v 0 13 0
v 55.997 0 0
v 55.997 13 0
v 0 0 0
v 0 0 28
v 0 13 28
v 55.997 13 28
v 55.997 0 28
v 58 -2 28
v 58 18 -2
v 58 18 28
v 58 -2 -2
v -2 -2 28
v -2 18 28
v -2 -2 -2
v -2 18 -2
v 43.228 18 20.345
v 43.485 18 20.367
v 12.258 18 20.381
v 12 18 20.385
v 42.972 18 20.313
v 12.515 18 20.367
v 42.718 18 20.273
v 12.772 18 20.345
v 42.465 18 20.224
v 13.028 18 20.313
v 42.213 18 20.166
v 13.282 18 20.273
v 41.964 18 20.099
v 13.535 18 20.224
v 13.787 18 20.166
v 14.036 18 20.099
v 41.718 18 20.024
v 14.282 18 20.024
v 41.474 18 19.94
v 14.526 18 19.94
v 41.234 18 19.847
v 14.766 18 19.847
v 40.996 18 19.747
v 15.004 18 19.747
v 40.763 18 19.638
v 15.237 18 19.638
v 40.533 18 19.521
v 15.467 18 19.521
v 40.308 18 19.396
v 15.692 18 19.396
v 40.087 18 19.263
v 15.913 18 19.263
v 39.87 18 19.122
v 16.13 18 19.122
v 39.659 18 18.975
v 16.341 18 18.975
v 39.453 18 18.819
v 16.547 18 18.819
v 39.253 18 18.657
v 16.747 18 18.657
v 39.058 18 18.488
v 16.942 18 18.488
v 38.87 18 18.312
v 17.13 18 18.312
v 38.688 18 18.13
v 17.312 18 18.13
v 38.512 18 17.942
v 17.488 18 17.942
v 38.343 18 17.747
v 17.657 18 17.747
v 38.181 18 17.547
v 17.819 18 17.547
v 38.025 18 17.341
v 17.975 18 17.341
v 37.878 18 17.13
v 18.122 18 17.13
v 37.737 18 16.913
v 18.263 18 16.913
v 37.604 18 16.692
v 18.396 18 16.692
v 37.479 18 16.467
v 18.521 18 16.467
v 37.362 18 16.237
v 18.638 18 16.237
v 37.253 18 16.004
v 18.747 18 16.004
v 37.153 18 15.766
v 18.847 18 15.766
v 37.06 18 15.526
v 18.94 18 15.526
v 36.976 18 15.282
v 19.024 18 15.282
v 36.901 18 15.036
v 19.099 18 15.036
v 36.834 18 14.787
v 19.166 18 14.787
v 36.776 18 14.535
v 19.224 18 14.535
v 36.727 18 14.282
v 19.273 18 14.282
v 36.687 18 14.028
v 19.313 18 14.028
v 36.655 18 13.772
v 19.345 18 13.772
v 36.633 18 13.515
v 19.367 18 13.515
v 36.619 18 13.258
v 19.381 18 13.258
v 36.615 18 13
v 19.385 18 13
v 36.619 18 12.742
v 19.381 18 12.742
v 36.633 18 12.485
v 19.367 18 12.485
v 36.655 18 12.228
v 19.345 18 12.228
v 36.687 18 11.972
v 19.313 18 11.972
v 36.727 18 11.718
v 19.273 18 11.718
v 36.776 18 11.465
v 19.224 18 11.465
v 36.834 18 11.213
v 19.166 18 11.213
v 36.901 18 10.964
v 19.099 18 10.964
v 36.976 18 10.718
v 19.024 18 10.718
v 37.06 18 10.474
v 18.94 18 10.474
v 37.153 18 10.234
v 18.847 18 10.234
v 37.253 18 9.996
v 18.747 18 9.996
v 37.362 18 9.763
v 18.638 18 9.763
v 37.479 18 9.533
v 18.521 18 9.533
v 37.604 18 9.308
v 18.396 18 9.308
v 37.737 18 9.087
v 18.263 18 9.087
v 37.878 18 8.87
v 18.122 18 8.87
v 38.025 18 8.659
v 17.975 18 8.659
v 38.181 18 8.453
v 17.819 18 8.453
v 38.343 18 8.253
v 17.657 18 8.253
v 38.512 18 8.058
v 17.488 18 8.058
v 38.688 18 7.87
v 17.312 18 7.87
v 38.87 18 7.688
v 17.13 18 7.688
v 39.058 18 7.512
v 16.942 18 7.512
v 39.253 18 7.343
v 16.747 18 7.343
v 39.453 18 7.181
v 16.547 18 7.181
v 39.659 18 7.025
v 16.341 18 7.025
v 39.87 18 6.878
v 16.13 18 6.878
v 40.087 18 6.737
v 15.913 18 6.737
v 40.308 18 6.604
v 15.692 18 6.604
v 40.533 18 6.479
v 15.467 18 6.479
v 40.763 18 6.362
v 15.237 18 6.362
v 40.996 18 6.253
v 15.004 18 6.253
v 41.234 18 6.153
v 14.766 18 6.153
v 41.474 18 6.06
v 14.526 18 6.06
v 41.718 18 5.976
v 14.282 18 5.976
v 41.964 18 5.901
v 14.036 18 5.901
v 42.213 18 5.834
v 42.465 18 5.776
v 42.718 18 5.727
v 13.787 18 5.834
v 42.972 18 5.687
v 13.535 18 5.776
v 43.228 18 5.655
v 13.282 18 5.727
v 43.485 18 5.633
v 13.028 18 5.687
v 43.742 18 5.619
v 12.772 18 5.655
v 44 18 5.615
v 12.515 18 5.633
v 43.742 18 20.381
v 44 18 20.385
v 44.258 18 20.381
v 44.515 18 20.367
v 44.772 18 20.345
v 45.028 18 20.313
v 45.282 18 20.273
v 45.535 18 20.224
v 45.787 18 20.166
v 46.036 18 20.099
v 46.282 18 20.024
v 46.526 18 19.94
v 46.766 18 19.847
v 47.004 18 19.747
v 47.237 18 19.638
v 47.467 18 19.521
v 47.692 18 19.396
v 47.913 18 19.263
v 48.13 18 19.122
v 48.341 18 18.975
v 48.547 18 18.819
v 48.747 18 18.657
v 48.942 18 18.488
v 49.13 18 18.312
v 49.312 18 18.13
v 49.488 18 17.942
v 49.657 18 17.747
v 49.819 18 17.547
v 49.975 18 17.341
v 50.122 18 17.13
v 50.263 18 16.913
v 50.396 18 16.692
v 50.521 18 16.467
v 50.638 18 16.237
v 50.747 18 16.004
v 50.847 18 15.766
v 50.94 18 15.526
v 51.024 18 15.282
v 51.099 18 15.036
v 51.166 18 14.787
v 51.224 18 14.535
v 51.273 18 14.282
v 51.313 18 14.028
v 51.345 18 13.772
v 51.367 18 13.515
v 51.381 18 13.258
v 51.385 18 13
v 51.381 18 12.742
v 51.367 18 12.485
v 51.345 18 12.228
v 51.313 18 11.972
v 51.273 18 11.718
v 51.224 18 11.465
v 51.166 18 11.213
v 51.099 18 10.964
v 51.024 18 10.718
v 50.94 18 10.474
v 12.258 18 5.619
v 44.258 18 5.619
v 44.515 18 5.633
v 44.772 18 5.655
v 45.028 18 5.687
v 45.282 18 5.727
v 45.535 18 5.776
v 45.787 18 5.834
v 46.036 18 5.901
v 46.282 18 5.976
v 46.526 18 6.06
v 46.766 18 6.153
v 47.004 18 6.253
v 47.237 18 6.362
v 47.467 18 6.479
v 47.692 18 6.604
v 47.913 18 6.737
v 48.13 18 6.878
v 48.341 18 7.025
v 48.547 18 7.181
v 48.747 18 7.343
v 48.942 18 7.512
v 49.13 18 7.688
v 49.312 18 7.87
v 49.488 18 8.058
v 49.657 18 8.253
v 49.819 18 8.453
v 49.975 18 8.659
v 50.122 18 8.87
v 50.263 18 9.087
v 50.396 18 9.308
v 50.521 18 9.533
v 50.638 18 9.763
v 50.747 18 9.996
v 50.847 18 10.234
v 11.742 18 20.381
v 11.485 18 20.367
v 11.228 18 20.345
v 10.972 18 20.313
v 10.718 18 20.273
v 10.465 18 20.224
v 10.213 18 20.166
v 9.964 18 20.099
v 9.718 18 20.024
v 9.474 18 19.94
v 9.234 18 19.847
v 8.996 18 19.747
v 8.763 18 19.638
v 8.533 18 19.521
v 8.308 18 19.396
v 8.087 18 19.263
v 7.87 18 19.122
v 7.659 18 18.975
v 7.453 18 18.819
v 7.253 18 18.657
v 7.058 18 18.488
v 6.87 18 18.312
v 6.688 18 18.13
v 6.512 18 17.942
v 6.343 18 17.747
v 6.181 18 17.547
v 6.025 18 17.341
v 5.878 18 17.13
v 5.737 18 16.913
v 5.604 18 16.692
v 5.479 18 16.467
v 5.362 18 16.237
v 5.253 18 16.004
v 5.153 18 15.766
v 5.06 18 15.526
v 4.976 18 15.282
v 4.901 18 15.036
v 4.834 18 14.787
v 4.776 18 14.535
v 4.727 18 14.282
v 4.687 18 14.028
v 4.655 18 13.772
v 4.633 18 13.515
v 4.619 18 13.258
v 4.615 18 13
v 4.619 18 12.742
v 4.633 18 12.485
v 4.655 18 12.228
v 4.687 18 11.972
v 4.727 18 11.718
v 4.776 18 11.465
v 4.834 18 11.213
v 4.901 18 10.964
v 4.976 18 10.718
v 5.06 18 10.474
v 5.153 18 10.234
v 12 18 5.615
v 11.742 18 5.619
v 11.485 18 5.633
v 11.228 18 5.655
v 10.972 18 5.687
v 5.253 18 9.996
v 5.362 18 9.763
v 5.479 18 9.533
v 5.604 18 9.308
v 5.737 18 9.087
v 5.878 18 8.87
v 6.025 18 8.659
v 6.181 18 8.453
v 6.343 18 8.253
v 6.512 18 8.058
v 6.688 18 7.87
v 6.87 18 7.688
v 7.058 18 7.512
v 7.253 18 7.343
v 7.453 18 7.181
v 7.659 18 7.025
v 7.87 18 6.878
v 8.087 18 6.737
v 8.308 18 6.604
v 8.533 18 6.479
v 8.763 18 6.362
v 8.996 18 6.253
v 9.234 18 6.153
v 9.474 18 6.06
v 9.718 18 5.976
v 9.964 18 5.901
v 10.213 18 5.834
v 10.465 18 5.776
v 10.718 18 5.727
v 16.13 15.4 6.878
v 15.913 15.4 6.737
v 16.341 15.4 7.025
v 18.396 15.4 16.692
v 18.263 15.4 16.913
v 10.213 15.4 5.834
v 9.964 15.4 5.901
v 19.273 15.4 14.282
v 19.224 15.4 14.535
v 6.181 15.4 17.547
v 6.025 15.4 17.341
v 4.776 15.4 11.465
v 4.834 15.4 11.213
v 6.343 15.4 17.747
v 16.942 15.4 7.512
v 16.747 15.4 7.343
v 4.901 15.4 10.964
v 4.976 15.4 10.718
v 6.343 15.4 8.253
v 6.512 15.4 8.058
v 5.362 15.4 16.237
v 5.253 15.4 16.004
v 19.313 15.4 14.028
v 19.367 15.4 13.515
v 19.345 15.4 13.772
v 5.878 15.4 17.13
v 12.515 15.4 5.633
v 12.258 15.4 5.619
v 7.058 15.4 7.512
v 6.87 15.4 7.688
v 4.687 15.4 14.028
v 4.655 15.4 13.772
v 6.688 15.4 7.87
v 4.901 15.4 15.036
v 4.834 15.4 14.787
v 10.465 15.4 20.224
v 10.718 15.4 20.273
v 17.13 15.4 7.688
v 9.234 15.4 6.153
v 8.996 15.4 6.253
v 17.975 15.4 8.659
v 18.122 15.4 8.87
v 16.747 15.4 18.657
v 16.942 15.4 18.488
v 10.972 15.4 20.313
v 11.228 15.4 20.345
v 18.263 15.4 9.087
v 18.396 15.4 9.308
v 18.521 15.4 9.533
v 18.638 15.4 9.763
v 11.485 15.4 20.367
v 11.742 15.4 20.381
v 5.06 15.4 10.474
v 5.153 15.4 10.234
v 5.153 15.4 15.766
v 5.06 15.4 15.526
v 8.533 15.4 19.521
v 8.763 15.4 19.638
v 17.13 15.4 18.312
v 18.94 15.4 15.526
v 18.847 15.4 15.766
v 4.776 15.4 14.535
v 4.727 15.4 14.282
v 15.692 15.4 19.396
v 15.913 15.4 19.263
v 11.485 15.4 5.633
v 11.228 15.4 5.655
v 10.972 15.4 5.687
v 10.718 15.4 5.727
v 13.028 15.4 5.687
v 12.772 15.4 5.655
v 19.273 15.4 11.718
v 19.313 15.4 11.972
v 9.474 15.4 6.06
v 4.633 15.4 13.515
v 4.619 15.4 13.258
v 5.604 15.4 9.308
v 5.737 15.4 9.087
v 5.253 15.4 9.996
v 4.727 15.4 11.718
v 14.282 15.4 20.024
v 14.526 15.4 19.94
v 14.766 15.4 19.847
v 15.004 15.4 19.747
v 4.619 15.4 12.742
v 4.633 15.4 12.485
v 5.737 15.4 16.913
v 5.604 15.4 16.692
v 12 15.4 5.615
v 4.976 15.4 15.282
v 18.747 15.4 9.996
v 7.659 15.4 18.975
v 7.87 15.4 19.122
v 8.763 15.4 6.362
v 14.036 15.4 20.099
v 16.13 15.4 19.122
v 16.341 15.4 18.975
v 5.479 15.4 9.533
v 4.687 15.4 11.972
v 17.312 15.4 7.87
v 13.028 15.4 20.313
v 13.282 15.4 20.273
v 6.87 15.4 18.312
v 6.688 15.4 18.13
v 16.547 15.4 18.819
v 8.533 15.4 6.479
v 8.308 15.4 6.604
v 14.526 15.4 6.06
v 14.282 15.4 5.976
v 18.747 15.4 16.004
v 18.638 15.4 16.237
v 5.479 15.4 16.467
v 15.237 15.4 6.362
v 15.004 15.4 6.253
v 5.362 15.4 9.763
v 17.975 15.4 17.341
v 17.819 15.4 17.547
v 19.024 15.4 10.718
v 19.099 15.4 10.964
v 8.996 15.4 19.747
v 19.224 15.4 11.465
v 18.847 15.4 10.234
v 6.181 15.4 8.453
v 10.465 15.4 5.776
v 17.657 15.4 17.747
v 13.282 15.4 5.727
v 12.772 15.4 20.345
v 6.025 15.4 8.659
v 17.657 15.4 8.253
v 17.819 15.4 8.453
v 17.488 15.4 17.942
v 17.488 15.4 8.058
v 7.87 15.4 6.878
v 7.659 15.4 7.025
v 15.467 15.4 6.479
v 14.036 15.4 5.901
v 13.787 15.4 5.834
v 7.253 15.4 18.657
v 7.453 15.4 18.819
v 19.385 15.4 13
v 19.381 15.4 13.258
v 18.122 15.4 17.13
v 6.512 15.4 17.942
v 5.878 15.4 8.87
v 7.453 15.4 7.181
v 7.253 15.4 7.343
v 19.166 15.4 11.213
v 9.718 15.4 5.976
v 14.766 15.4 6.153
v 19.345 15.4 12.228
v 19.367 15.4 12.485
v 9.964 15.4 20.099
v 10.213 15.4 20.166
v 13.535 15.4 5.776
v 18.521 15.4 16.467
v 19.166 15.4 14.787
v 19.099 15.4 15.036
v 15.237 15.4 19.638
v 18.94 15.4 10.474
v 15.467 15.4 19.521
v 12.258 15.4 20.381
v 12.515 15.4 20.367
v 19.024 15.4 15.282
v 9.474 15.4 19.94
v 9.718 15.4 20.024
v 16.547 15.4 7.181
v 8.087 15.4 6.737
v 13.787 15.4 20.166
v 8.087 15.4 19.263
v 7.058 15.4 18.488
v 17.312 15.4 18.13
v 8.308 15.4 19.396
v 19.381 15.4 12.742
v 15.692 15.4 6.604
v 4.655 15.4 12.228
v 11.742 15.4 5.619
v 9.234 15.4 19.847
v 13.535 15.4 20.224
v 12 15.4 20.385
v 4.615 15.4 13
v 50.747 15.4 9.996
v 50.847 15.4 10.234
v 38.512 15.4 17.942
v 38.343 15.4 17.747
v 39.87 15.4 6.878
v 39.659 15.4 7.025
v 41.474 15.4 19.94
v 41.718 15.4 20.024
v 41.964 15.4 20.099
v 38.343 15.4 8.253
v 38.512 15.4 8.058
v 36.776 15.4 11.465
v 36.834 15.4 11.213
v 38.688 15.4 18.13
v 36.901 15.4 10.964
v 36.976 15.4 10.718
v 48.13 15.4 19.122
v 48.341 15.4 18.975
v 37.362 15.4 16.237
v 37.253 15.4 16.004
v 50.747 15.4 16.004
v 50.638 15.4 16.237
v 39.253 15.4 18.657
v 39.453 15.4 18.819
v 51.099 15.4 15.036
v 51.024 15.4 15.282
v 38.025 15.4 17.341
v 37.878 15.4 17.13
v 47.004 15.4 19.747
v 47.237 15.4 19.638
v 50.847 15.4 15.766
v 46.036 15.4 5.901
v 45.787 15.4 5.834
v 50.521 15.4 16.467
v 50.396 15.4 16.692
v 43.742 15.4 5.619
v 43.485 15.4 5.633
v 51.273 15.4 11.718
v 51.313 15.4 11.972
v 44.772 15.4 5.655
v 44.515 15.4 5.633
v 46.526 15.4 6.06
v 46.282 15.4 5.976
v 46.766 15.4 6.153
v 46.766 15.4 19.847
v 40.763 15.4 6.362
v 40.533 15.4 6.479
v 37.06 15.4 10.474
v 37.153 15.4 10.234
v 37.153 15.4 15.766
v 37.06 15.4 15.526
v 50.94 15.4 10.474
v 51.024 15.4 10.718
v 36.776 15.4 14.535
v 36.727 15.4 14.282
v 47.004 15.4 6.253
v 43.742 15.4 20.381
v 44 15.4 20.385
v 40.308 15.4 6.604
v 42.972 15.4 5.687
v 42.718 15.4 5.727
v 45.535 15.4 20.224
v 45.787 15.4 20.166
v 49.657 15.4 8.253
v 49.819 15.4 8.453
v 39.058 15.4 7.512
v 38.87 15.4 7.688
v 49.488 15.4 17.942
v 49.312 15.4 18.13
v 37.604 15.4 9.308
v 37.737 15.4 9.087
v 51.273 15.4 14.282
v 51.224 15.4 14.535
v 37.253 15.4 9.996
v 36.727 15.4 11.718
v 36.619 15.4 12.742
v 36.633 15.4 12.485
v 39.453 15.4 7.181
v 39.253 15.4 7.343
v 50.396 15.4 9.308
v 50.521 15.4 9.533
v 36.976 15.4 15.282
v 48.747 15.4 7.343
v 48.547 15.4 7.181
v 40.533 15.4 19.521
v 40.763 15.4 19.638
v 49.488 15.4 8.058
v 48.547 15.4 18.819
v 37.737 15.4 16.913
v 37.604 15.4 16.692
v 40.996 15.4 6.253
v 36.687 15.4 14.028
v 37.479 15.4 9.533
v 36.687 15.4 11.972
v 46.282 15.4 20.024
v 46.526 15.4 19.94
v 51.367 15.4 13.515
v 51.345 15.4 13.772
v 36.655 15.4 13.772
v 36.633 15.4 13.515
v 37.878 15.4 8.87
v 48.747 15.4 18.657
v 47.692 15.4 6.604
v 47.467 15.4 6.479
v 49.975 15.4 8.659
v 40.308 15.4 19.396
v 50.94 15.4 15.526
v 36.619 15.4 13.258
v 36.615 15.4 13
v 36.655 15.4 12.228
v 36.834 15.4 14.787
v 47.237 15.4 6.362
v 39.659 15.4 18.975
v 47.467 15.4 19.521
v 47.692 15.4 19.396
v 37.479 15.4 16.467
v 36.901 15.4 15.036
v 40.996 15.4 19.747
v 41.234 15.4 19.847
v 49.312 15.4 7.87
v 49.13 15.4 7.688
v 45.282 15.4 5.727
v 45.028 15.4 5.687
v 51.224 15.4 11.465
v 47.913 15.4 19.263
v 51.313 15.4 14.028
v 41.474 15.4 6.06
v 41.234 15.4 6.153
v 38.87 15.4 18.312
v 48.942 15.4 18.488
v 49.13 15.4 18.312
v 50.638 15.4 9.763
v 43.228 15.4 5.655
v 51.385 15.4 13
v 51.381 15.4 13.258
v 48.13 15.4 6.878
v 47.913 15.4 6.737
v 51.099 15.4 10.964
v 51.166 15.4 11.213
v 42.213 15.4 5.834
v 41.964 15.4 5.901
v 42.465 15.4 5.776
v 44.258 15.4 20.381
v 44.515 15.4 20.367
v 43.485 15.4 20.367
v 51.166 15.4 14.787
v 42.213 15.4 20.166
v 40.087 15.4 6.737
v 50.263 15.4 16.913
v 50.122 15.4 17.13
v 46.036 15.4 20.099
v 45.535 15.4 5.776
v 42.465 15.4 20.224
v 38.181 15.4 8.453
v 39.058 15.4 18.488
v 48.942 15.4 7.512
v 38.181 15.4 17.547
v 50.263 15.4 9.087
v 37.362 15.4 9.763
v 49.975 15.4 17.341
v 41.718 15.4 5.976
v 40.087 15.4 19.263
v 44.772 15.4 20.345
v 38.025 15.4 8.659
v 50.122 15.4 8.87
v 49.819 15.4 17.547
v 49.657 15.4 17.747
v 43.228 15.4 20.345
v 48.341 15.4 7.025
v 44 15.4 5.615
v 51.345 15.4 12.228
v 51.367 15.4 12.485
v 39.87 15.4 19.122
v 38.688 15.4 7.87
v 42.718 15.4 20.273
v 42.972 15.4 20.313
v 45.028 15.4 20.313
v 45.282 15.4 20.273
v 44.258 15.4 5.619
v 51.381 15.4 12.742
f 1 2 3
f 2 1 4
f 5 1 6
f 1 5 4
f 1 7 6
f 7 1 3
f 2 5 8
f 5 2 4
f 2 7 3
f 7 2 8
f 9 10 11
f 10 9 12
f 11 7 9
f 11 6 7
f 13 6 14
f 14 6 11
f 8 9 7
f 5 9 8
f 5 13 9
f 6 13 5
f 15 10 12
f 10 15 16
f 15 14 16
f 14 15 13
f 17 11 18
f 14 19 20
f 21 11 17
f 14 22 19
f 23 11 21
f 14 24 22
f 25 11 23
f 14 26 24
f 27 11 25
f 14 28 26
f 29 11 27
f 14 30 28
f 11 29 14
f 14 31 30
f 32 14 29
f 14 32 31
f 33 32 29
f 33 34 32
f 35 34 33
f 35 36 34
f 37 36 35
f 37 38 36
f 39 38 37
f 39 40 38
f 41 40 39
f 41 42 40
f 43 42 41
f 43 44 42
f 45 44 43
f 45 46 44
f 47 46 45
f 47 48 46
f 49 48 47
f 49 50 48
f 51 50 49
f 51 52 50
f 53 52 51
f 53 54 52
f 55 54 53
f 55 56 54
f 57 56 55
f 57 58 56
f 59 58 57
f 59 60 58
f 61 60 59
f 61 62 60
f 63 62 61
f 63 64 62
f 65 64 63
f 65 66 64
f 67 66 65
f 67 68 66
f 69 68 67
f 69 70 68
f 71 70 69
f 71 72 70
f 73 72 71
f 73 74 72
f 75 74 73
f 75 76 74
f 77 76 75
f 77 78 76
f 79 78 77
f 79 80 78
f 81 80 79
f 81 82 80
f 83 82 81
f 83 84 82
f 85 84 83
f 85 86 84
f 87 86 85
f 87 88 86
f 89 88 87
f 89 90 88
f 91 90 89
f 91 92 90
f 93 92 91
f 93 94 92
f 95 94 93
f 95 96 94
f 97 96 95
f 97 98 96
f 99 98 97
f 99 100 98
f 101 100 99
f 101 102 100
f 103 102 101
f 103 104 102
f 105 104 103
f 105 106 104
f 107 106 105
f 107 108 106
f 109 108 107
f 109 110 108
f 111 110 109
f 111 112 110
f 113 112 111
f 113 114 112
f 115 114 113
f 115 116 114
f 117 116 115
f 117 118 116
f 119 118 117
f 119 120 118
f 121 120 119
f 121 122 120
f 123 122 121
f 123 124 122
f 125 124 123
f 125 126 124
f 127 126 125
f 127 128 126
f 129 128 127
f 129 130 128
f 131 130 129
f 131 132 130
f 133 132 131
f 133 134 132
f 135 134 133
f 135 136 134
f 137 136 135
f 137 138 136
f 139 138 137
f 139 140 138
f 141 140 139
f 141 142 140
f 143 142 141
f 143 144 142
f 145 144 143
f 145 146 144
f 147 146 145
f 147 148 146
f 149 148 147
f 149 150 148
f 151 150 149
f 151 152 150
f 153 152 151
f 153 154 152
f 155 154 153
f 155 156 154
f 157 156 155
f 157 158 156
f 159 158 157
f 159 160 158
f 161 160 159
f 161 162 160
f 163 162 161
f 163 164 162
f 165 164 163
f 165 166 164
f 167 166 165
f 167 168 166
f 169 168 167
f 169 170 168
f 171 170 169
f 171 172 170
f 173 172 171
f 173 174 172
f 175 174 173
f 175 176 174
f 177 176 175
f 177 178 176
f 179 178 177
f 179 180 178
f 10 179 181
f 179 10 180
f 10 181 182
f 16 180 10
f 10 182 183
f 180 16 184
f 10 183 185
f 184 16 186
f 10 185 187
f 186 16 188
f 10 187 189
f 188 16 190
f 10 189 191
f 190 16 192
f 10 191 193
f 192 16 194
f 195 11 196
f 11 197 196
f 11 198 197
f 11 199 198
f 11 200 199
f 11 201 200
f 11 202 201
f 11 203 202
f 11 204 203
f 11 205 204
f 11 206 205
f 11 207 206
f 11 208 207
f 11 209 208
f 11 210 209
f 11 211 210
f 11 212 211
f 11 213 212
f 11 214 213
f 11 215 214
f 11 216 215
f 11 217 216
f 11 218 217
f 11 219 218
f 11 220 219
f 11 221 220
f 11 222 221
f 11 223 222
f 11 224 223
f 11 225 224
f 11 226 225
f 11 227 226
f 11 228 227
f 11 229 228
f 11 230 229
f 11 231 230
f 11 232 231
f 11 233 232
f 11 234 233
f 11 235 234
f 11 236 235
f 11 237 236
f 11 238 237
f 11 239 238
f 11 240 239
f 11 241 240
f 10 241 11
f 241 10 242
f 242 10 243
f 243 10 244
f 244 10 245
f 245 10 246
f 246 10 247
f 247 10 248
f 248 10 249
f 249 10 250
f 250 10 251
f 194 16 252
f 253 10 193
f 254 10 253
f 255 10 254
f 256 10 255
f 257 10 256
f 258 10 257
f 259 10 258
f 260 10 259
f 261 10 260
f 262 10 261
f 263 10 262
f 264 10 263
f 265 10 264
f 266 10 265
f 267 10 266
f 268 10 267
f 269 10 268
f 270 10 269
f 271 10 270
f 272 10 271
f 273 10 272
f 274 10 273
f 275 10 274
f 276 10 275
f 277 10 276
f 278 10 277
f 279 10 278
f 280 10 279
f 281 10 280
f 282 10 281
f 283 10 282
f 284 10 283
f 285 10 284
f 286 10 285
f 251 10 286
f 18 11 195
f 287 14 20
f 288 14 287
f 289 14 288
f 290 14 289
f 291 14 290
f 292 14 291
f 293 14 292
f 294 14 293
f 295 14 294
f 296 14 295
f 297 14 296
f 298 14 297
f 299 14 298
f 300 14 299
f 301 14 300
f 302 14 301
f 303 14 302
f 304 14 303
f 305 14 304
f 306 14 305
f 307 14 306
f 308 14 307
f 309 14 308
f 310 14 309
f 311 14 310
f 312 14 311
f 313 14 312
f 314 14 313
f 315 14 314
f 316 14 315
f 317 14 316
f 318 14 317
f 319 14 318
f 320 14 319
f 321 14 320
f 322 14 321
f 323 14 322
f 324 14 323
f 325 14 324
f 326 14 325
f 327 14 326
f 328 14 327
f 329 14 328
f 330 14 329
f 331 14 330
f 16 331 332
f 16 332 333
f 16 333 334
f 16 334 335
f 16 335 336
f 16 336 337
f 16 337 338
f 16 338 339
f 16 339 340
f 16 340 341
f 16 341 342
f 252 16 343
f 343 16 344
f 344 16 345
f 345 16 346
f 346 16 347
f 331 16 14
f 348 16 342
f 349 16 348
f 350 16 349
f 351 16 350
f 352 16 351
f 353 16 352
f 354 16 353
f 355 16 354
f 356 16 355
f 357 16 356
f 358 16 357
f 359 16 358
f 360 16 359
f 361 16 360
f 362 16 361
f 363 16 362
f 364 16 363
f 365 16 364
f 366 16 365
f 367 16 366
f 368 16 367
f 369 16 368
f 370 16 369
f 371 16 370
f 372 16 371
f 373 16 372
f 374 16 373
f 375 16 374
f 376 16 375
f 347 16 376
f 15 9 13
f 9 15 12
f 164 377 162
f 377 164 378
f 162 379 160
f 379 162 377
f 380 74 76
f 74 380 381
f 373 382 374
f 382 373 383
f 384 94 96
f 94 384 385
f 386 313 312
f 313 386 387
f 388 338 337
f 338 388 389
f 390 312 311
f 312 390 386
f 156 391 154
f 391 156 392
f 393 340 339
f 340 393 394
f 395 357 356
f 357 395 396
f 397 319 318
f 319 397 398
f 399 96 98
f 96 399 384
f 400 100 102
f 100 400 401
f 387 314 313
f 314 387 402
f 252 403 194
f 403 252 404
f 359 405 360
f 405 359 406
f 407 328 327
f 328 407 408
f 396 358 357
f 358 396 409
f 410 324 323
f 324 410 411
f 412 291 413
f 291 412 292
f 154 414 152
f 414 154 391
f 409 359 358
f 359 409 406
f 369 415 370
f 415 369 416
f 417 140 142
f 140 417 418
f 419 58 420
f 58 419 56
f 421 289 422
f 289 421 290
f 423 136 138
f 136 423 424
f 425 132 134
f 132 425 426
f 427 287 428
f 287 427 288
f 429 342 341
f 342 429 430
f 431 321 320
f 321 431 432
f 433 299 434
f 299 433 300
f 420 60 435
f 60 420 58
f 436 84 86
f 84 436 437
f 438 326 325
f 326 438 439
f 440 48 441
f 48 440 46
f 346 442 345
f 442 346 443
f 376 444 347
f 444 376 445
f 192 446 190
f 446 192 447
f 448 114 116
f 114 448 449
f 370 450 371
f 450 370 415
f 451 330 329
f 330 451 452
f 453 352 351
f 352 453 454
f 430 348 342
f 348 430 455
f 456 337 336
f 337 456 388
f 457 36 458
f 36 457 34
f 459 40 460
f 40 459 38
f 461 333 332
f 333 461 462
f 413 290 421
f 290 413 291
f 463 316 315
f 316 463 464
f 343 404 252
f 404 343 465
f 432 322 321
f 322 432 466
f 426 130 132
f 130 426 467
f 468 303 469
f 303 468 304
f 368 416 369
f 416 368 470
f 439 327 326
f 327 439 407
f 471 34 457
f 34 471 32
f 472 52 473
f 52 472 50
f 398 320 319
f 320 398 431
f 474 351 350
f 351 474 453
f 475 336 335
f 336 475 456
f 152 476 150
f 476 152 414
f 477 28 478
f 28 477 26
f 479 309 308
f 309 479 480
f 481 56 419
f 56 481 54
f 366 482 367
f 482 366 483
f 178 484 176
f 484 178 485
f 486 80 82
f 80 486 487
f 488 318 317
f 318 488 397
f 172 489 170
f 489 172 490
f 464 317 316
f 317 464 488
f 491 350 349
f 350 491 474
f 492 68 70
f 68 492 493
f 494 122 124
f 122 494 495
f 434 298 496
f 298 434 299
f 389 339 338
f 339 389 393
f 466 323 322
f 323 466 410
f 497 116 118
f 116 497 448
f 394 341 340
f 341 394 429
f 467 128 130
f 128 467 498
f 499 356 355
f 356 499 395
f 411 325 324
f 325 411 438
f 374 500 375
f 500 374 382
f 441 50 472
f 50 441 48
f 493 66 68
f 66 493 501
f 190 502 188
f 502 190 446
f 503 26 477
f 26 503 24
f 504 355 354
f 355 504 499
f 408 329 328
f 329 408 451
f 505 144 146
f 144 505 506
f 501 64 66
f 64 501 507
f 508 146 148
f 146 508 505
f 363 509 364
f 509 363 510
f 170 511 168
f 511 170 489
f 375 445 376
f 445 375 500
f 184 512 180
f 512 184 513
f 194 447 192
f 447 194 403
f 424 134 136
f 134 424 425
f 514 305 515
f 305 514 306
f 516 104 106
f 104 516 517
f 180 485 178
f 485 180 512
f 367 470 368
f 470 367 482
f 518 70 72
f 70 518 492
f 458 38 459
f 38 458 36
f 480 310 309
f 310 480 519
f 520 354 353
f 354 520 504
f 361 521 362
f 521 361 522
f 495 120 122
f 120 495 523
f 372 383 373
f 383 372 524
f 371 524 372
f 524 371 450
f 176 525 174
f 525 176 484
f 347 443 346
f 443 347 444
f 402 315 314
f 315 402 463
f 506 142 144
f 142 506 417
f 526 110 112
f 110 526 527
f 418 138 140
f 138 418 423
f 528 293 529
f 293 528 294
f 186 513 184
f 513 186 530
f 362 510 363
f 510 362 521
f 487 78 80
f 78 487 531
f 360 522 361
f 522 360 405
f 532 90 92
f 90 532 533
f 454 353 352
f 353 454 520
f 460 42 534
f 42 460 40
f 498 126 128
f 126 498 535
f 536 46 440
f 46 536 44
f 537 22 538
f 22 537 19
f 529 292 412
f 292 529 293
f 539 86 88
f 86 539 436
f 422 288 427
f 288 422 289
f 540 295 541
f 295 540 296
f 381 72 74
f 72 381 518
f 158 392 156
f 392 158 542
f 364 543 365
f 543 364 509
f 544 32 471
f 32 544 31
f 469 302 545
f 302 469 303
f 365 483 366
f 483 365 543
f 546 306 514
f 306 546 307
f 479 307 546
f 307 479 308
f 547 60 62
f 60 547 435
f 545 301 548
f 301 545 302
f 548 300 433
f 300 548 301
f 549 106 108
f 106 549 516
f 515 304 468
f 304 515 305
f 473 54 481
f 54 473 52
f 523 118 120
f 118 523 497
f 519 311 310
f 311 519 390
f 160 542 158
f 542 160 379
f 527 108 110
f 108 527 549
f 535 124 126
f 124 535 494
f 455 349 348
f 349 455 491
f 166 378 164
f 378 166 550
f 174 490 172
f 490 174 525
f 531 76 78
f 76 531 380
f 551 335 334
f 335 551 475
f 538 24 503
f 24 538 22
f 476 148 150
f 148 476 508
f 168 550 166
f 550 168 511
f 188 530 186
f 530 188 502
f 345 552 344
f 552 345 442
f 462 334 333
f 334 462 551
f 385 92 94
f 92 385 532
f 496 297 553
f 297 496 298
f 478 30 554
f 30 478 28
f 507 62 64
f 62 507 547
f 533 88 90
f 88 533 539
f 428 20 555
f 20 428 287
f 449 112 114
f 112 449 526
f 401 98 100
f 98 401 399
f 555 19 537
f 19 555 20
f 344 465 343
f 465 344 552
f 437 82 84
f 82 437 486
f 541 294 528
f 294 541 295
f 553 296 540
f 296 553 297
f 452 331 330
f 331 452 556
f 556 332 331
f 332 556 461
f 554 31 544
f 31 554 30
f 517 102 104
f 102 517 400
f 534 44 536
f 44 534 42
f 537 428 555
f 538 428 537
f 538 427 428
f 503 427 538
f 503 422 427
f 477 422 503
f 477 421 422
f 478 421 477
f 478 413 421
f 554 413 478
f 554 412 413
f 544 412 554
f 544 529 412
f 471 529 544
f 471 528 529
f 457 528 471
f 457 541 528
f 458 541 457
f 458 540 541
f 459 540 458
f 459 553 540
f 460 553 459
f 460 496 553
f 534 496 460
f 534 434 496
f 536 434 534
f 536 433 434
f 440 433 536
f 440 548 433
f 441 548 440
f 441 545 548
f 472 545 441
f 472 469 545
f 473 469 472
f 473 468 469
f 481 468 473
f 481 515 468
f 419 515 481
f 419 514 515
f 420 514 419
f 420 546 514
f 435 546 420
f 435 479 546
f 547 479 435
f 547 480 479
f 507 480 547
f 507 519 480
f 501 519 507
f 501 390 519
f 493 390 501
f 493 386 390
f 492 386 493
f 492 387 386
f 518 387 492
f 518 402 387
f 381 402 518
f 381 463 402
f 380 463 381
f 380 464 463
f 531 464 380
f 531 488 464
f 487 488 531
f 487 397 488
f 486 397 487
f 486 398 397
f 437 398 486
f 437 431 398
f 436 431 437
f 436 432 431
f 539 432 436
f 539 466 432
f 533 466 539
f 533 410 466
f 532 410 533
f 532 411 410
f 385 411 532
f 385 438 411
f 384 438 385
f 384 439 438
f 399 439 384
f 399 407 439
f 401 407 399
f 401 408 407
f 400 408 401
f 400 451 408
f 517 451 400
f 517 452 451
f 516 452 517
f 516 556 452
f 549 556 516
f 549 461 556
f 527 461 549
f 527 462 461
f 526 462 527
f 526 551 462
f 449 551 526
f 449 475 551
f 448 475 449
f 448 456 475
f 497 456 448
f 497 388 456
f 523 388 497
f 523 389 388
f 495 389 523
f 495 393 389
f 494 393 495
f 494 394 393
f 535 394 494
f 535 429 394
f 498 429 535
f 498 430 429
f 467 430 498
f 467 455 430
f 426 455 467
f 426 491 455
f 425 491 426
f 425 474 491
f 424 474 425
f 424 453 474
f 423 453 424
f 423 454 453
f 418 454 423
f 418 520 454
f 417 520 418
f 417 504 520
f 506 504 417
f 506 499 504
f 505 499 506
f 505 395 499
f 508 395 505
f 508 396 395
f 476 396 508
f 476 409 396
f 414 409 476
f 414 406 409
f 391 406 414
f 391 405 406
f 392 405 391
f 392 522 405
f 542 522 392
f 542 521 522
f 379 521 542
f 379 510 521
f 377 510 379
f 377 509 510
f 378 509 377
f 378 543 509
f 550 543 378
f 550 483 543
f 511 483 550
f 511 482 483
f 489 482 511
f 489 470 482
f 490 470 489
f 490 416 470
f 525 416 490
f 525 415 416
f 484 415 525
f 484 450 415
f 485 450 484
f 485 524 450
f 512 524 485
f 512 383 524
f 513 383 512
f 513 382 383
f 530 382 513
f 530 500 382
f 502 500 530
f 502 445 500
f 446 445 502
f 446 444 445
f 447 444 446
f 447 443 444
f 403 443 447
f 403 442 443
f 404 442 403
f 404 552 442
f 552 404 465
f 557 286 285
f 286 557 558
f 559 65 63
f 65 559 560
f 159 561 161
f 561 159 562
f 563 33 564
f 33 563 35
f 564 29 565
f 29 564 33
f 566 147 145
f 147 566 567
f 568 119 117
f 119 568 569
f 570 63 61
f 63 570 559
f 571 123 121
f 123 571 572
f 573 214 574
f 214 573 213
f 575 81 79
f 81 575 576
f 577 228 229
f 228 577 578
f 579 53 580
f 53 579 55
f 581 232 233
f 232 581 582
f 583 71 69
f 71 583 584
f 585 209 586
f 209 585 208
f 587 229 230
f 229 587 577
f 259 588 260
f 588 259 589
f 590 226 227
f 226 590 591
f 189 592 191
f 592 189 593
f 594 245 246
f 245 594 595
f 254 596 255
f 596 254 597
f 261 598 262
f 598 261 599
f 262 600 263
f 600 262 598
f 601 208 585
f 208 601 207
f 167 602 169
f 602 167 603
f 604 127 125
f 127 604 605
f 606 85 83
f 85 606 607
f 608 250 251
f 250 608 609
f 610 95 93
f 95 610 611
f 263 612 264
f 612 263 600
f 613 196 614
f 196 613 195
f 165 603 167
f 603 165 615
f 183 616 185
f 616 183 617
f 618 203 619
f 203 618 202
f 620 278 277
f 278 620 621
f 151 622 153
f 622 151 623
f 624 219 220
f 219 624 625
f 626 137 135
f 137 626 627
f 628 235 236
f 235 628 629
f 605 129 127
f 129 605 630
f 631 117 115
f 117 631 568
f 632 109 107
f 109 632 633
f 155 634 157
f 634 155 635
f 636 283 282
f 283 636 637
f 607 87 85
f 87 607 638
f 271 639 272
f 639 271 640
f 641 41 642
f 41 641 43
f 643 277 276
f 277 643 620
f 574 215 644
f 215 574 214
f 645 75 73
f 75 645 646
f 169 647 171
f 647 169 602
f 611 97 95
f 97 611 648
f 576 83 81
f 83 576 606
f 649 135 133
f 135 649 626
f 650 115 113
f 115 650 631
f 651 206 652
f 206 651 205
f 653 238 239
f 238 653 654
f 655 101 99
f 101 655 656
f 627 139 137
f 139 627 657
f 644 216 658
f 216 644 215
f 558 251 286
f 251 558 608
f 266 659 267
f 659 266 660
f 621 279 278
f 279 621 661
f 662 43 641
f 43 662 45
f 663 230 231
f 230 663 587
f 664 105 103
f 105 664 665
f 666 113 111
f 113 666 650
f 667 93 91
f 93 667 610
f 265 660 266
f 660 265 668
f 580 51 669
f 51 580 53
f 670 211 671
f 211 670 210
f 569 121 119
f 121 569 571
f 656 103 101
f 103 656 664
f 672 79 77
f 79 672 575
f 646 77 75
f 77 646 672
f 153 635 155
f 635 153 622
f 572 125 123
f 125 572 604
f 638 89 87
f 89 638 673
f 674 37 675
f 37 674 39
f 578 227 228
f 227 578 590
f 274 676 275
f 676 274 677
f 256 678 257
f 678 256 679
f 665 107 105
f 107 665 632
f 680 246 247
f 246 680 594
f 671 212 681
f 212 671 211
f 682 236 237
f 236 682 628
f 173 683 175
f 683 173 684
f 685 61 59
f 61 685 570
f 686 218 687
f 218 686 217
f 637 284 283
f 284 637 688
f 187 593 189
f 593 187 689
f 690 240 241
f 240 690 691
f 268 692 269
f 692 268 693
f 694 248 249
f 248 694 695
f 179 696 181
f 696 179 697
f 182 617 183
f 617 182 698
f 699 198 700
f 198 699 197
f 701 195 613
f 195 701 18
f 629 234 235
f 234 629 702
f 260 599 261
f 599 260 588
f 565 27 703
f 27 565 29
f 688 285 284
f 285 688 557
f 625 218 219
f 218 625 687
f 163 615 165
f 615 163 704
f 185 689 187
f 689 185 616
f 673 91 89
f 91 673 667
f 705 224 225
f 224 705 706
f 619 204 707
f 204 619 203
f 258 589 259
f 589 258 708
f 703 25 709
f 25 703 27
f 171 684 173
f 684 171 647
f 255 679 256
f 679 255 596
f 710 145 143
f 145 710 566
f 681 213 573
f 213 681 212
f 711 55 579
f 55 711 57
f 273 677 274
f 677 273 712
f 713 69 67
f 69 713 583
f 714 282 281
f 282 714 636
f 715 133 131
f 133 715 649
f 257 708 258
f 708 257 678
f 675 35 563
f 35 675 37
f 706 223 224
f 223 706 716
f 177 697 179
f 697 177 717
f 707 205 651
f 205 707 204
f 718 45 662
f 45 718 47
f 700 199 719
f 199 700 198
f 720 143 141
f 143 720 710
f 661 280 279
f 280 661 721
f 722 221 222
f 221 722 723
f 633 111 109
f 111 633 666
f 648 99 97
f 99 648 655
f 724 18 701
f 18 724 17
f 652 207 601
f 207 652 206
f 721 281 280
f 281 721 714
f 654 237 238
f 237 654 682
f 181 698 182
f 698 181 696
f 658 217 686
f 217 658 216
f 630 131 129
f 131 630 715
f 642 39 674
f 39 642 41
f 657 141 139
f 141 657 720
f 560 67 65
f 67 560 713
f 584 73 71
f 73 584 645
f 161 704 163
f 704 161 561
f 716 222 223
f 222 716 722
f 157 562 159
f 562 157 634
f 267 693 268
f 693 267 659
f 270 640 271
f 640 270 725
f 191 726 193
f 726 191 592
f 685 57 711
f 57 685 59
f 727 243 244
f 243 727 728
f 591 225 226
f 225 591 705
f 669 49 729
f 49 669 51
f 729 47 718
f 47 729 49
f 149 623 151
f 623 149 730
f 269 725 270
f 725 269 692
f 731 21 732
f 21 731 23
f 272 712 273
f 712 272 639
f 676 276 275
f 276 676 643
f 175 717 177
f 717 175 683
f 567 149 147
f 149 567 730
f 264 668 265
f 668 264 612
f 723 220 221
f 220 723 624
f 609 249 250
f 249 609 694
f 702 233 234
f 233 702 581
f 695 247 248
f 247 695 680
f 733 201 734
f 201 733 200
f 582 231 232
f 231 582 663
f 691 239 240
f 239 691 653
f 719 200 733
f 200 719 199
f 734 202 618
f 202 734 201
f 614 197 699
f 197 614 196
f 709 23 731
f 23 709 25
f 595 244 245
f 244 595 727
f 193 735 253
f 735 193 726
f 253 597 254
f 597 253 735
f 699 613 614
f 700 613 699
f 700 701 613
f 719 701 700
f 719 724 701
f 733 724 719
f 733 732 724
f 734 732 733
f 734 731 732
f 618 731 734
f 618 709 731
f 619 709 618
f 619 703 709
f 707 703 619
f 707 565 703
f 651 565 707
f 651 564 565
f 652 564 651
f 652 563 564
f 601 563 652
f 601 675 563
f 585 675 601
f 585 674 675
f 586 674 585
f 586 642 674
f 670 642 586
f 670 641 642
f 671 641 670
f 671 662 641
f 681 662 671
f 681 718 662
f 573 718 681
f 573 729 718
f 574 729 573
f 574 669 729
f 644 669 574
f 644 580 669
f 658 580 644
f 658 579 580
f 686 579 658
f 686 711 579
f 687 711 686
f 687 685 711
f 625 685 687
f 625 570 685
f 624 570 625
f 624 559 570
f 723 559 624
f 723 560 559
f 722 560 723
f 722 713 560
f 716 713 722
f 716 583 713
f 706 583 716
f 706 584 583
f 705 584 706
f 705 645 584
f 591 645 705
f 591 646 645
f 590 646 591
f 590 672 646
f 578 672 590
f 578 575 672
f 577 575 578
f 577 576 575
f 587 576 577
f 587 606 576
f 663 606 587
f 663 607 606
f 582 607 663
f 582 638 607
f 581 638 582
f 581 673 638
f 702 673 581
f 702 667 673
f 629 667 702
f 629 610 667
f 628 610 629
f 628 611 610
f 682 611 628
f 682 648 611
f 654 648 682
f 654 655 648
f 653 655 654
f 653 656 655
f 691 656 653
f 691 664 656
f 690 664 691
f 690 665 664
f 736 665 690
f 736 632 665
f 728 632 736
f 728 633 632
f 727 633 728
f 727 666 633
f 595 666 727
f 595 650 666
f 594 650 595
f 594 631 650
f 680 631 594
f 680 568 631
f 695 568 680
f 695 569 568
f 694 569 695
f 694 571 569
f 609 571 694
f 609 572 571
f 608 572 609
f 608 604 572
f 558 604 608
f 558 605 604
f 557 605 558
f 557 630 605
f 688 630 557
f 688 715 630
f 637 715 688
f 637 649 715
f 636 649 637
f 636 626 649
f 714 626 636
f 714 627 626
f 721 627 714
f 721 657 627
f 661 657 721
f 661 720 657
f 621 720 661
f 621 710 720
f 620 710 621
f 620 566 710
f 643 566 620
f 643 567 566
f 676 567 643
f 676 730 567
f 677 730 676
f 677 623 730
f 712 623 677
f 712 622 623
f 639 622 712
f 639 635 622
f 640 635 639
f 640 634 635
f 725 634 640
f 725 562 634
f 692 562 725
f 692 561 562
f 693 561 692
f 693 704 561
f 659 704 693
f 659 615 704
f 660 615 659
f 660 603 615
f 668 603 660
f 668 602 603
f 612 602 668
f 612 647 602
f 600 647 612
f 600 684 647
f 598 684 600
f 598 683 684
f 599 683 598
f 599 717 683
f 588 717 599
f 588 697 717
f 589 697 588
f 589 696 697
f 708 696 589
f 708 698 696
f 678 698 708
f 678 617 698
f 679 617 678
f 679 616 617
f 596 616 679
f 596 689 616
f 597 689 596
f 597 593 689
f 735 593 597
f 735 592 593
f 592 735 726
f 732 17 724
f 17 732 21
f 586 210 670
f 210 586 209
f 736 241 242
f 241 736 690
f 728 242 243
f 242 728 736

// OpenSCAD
$fn=180;

module marker() {
    color("red") cube([13,12,24]);
    color("white") translate([13/2,12/2,24]) cylinder(d=9.5,h=83);
}

module marker_bound() {
    spacer=0.5;
    cube([13+spacer*2,12+spacer*2,24+83]);
}

module markers() {
    spacing=14;
    marker();
    translate([spacing,0,0]) marker();
    translate([spacing*2,0,0]) marker();
    translate([spacing*3,0,0]) marker();
}


module magnet() {
    difference() {
        cylinder(h=2.61,d=14.77);
        translate([0,0,-0.01]) cylinder(d=14.77-5.3*2, h=1.35+0.02);
        translate([0,0,1.35]) cylinder(d1=14.77-5.3*2, d2=14.77-4.17*2, h=2.61-1.35+0.01);
    }
    
}


module markerspacers() {
    spacing=13.999;
    union() {
        marker_bound();
        translate([spacing,0,0]) marker_bound();
        translate([spacing*2,0,0]) marker_bound();
        translate([spacing*3,0,0]) marker_bound();
    }
}

module box() {
    difference() {
        wall=2;
        translate([-wall,-wall,-wall]) cube([14*4+wall*2,14+wall*3,30]);
        markerspacers();
        translate([12,14+wall*2+0.01,15-wall]) rotate([90,0,0]) hull() magnet();
        translate([14*4-12,14+wall*2+0.01,15-wall]) rotate([90,0,0]) hull() magnet();
    }
}

box();
//markers();
